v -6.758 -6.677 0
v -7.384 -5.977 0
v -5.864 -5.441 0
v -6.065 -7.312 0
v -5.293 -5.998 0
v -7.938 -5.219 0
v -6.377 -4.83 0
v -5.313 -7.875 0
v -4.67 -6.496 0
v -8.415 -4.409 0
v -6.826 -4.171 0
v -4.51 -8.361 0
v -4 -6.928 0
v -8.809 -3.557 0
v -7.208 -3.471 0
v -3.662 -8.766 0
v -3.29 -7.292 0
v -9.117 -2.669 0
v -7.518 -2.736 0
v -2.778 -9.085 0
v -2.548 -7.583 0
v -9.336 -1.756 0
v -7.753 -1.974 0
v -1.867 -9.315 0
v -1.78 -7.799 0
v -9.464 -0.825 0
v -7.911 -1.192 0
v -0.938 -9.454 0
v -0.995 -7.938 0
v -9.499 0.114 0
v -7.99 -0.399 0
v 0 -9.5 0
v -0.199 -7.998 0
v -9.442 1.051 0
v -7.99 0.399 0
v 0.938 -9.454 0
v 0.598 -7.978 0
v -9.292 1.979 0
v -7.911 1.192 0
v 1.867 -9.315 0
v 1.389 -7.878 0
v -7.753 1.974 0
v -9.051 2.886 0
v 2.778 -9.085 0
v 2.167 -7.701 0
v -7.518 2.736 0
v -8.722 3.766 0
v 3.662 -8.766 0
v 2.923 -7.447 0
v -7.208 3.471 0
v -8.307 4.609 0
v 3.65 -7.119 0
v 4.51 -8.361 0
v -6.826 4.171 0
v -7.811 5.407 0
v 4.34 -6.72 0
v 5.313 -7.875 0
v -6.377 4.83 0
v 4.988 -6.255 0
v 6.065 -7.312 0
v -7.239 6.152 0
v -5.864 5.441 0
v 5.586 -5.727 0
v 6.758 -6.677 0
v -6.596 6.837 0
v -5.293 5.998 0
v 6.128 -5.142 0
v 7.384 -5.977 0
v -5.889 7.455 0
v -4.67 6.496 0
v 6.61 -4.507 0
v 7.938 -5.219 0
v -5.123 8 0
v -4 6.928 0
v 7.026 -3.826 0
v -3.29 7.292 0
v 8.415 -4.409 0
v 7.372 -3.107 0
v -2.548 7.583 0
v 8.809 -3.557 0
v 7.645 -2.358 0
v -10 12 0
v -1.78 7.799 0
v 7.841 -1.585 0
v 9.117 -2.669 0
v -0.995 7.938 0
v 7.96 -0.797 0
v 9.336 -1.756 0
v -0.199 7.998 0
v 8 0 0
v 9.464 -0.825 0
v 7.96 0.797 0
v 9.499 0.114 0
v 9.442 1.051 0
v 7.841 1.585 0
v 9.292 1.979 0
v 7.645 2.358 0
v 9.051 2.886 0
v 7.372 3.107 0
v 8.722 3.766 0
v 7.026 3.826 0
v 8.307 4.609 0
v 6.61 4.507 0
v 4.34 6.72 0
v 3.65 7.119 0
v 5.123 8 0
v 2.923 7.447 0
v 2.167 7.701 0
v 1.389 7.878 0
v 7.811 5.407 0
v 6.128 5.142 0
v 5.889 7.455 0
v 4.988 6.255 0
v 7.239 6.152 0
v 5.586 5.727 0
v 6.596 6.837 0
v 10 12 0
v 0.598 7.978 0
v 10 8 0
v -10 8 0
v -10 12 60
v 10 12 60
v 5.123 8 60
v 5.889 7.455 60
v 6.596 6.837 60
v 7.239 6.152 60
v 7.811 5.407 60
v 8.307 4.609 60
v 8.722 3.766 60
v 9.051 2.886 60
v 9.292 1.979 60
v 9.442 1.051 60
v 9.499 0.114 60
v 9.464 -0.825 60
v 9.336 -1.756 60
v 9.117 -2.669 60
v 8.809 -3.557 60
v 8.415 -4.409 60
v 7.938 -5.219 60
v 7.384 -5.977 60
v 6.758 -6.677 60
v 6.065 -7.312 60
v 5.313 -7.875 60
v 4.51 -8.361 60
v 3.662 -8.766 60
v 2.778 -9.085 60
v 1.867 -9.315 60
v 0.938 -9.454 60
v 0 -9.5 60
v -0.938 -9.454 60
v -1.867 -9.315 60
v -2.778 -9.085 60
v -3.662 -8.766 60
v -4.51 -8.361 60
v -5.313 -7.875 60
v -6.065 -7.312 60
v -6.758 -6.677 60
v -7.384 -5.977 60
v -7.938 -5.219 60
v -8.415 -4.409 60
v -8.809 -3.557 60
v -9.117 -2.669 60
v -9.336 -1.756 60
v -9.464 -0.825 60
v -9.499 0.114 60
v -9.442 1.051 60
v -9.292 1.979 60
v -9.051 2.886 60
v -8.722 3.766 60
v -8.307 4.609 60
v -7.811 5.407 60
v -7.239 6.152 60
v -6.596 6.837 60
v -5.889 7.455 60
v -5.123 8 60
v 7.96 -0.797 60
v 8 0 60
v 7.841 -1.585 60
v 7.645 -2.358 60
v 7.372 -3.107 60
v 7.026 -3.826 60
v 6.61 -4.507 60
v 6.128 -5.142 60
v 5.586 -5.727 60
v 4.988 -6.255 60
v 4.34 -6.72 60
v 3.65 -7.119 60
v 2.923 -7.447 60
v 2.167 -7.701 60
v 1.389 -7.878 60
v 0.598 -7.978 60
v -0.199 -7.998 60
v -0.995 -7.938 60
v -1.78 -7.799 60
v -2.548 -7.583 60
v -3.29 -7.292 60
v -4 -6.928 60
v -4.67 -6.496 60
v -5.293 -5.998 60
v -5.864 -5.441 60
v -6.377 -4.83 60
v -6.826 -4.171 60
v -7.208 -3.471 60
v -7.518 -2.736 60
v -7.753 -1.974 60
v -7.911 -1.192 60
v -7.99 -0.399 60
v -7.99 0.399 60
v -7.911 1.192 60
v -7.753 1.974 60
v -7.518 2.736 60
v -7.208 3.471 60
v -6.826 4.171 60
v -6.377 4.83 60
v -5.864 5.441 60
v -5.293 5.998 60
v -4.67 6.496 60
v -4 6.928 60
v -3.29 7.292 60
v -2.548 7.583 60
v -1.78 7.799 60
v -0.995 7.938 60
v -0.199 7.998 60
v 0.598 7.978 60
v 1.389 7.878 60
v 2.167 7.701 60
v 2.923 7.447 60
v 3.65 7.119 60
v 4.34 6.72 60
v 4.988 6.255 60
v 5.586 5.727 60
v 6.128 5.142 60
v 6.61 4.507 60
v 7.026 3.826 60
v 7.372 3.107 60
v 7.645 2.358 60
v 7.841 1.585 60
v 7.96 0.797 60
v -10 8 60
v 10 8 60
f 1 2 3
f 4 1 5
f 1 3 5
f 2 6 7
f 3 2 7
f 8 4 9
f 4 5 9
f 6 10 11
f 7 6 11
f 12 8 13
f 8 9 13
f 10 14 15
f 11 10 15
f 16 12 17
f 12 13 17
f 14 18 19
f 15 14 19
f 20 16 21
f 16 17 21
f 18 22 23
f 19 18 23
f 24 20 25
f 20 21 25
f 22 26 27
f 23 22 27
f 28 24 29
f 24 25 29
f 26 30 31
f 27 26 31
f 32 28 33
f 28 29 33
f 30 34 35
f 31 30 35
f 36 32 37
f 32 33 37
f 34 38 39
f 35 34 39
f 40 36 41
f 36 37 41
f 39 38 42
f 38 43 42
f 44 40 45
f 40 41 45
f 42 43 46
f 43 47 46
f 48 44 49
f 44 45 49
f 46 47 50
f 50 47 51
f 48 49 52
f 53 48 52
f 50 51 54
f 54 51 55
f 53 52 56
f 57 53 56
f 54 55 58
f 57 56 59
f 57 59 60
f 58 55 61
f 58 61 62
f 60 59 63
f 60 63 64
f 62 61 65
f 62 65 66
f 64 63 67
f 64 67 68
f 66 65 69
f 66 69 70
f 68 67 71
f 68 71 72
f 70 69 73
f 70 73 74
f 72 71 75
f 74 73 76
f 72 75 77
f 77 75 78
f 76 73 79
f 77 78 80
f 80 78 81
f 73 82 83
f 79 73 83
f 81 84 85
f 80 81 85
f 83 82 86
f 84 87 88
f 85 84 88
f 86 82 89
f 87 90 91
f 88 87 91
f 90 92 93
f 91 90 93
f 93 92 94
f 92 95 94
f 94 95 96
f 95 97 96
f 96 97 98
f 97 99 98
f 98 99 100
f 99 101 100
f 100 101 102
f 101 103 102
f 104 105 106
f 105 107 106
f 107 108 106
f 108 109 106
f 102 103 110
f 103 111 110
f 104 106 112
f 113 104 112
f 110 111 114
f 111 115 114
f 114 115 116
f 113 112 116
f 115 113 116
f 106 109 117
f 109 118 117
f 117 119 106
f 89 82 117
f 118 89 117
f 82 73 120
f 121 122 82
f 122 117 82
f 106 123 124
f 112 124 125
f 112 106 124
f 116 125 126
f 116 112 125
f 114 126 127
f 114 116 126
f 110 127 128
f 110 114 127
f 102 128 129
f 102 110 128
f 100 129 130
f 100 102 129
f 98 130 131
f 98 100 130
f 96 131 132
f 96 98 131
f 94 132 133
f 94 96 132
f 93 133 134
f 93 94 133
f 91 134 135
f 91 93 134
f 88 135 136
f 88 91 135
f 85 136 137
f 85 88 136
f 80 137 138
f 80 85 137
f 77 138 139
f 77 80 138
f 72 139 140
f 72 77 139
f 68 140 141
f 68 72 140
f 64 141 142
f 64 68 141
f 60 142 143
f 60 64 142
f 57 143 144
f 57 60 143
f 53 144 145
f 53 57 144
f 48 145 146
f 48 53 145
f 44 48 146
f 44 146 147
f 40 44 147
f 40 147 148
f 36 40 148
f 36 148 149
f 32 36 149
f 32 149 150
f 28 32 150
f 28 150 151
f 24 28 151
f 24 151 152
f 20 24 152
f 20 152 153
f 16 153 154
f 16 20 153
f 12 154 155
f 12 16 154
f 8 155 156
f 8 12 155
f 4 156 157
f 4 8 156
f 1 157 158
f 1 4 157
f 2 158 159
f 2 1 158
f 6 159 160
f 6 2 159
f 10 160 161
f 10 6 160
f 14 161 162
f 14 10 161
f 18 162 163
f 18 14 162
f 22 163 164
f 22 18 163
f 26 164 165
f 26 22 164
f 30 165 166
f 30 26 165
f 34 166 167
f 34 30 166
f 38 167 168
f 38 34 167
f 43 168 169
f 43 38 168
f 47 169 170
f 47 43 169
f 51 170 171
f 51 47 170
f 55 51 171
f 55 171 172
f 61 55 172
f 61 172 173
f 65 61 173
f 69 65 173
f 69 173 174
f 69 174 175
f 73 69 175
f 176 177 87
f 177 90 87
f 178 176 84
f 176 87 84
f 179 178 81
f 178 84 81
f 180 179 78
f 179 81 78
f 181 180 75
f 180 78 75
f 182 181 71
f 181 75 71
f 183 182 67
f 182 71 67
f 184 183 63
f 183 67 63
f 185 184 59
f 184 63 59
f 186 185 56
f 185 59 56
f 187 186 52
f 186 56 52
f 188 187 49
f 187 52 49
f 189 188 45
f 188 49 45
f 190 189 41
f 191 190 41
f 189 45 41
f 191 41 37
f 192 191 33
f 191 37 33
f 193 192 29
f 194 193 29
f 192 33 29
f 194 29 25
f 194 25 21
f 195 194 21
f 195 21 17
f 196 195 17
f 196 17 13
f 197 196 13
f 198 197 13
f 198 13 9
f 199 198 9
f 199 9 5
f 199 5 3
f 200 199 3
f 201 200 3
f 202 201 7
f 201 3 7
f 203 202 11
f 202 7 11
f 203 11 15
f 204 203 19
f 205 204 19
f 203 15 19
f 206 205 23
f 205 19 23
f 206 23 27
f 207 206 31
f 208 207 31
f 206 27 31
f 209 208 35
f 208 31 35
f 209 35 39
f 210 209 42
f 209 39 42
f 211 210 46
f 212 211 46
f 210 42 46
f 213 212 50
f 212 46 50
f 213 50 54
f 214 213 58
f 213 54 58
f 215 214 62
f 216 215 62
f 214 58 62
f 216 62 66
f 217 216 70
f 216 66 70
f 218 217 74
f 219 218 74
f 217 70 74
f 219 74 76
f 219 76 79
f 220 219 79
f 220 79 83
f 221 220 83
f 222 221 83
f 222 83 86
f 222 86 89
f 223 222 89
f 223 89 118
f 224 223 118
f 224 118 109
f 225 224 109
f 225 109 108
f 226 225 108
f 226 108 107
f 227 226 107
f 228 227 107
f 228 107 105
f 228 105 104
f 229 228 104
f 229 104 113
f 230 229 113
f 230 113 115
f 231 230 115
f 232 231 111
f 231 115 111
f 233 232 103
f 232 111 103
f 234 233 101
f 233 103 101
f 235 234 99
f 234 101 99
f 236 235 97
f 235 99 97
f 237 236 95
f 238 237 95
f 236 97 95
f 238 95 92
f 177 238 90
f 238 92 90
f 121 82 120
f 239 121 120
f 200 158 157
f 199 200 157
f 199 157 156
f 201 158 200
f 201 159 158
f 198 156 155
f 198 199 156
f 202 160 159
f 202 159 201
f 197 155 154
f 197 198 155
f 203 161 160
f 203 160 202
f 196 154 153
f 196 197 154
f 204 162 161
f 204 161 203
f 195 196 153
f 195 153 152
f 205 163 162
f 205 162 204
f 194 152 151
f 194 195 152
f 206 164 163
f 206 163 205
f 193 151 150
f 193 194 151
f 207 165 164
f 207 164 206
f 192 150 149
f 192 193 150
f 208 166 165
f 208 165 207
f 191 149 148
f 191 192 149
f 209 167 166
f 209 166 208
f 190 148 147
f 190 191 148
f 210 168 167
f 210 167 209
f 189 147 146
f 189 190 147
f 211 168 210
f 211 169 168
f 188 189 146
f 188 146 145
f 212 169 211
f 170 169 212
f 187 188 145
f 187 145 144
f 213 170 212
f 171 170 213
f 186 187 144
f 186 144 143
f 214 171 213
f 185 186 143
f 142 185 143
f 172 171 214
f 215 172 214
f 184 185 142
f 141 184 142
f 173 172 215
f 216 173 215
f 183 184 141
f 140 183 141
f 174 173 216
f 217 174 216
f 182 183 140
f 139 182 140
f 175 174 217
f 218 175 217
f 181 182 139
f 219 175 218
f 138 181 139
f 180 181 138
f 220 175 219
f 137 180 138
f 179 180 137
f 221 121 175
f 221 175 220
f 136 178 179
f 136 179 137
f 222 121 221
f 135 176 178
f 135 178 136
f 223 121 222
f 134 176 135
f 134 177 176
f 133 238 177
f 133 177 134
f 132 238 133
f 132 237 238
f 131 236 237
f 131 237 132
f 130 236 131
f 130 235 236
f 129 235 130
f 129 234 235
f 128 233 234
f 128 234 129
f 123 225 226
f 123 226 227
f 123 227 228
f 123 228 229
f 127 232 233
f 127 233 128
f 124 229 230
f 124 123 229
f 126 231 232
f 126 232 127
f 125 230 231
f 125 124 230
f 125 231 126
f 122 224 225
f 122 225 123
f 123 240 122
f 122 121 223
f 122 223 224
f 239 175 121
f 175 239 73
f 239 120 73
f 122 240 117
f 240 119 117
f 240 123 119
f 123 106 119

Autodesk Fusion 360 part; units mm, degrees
sketch "Sketch1" plane through (0, 0, 0) normal (0, 0, 1) x (1, 0, 0)
  circle A0 centre (0, 0) radius 8
  circle A1 centre (0, 0) radius 9.5
  line L0 (-10, 8) -> (10, 8)
  line L1 (10, 8) -> (10, 12)
  line L2 (10, 12) -> (-10, 12)
  line L3 (-10, 12) -> (-10, 8)
  dimension "d1" = 16
  dimension "d2" = 19
  dimension "d3" = 20
extrude "Extrude1" add sketch "Sketch1" along normal blind 60
